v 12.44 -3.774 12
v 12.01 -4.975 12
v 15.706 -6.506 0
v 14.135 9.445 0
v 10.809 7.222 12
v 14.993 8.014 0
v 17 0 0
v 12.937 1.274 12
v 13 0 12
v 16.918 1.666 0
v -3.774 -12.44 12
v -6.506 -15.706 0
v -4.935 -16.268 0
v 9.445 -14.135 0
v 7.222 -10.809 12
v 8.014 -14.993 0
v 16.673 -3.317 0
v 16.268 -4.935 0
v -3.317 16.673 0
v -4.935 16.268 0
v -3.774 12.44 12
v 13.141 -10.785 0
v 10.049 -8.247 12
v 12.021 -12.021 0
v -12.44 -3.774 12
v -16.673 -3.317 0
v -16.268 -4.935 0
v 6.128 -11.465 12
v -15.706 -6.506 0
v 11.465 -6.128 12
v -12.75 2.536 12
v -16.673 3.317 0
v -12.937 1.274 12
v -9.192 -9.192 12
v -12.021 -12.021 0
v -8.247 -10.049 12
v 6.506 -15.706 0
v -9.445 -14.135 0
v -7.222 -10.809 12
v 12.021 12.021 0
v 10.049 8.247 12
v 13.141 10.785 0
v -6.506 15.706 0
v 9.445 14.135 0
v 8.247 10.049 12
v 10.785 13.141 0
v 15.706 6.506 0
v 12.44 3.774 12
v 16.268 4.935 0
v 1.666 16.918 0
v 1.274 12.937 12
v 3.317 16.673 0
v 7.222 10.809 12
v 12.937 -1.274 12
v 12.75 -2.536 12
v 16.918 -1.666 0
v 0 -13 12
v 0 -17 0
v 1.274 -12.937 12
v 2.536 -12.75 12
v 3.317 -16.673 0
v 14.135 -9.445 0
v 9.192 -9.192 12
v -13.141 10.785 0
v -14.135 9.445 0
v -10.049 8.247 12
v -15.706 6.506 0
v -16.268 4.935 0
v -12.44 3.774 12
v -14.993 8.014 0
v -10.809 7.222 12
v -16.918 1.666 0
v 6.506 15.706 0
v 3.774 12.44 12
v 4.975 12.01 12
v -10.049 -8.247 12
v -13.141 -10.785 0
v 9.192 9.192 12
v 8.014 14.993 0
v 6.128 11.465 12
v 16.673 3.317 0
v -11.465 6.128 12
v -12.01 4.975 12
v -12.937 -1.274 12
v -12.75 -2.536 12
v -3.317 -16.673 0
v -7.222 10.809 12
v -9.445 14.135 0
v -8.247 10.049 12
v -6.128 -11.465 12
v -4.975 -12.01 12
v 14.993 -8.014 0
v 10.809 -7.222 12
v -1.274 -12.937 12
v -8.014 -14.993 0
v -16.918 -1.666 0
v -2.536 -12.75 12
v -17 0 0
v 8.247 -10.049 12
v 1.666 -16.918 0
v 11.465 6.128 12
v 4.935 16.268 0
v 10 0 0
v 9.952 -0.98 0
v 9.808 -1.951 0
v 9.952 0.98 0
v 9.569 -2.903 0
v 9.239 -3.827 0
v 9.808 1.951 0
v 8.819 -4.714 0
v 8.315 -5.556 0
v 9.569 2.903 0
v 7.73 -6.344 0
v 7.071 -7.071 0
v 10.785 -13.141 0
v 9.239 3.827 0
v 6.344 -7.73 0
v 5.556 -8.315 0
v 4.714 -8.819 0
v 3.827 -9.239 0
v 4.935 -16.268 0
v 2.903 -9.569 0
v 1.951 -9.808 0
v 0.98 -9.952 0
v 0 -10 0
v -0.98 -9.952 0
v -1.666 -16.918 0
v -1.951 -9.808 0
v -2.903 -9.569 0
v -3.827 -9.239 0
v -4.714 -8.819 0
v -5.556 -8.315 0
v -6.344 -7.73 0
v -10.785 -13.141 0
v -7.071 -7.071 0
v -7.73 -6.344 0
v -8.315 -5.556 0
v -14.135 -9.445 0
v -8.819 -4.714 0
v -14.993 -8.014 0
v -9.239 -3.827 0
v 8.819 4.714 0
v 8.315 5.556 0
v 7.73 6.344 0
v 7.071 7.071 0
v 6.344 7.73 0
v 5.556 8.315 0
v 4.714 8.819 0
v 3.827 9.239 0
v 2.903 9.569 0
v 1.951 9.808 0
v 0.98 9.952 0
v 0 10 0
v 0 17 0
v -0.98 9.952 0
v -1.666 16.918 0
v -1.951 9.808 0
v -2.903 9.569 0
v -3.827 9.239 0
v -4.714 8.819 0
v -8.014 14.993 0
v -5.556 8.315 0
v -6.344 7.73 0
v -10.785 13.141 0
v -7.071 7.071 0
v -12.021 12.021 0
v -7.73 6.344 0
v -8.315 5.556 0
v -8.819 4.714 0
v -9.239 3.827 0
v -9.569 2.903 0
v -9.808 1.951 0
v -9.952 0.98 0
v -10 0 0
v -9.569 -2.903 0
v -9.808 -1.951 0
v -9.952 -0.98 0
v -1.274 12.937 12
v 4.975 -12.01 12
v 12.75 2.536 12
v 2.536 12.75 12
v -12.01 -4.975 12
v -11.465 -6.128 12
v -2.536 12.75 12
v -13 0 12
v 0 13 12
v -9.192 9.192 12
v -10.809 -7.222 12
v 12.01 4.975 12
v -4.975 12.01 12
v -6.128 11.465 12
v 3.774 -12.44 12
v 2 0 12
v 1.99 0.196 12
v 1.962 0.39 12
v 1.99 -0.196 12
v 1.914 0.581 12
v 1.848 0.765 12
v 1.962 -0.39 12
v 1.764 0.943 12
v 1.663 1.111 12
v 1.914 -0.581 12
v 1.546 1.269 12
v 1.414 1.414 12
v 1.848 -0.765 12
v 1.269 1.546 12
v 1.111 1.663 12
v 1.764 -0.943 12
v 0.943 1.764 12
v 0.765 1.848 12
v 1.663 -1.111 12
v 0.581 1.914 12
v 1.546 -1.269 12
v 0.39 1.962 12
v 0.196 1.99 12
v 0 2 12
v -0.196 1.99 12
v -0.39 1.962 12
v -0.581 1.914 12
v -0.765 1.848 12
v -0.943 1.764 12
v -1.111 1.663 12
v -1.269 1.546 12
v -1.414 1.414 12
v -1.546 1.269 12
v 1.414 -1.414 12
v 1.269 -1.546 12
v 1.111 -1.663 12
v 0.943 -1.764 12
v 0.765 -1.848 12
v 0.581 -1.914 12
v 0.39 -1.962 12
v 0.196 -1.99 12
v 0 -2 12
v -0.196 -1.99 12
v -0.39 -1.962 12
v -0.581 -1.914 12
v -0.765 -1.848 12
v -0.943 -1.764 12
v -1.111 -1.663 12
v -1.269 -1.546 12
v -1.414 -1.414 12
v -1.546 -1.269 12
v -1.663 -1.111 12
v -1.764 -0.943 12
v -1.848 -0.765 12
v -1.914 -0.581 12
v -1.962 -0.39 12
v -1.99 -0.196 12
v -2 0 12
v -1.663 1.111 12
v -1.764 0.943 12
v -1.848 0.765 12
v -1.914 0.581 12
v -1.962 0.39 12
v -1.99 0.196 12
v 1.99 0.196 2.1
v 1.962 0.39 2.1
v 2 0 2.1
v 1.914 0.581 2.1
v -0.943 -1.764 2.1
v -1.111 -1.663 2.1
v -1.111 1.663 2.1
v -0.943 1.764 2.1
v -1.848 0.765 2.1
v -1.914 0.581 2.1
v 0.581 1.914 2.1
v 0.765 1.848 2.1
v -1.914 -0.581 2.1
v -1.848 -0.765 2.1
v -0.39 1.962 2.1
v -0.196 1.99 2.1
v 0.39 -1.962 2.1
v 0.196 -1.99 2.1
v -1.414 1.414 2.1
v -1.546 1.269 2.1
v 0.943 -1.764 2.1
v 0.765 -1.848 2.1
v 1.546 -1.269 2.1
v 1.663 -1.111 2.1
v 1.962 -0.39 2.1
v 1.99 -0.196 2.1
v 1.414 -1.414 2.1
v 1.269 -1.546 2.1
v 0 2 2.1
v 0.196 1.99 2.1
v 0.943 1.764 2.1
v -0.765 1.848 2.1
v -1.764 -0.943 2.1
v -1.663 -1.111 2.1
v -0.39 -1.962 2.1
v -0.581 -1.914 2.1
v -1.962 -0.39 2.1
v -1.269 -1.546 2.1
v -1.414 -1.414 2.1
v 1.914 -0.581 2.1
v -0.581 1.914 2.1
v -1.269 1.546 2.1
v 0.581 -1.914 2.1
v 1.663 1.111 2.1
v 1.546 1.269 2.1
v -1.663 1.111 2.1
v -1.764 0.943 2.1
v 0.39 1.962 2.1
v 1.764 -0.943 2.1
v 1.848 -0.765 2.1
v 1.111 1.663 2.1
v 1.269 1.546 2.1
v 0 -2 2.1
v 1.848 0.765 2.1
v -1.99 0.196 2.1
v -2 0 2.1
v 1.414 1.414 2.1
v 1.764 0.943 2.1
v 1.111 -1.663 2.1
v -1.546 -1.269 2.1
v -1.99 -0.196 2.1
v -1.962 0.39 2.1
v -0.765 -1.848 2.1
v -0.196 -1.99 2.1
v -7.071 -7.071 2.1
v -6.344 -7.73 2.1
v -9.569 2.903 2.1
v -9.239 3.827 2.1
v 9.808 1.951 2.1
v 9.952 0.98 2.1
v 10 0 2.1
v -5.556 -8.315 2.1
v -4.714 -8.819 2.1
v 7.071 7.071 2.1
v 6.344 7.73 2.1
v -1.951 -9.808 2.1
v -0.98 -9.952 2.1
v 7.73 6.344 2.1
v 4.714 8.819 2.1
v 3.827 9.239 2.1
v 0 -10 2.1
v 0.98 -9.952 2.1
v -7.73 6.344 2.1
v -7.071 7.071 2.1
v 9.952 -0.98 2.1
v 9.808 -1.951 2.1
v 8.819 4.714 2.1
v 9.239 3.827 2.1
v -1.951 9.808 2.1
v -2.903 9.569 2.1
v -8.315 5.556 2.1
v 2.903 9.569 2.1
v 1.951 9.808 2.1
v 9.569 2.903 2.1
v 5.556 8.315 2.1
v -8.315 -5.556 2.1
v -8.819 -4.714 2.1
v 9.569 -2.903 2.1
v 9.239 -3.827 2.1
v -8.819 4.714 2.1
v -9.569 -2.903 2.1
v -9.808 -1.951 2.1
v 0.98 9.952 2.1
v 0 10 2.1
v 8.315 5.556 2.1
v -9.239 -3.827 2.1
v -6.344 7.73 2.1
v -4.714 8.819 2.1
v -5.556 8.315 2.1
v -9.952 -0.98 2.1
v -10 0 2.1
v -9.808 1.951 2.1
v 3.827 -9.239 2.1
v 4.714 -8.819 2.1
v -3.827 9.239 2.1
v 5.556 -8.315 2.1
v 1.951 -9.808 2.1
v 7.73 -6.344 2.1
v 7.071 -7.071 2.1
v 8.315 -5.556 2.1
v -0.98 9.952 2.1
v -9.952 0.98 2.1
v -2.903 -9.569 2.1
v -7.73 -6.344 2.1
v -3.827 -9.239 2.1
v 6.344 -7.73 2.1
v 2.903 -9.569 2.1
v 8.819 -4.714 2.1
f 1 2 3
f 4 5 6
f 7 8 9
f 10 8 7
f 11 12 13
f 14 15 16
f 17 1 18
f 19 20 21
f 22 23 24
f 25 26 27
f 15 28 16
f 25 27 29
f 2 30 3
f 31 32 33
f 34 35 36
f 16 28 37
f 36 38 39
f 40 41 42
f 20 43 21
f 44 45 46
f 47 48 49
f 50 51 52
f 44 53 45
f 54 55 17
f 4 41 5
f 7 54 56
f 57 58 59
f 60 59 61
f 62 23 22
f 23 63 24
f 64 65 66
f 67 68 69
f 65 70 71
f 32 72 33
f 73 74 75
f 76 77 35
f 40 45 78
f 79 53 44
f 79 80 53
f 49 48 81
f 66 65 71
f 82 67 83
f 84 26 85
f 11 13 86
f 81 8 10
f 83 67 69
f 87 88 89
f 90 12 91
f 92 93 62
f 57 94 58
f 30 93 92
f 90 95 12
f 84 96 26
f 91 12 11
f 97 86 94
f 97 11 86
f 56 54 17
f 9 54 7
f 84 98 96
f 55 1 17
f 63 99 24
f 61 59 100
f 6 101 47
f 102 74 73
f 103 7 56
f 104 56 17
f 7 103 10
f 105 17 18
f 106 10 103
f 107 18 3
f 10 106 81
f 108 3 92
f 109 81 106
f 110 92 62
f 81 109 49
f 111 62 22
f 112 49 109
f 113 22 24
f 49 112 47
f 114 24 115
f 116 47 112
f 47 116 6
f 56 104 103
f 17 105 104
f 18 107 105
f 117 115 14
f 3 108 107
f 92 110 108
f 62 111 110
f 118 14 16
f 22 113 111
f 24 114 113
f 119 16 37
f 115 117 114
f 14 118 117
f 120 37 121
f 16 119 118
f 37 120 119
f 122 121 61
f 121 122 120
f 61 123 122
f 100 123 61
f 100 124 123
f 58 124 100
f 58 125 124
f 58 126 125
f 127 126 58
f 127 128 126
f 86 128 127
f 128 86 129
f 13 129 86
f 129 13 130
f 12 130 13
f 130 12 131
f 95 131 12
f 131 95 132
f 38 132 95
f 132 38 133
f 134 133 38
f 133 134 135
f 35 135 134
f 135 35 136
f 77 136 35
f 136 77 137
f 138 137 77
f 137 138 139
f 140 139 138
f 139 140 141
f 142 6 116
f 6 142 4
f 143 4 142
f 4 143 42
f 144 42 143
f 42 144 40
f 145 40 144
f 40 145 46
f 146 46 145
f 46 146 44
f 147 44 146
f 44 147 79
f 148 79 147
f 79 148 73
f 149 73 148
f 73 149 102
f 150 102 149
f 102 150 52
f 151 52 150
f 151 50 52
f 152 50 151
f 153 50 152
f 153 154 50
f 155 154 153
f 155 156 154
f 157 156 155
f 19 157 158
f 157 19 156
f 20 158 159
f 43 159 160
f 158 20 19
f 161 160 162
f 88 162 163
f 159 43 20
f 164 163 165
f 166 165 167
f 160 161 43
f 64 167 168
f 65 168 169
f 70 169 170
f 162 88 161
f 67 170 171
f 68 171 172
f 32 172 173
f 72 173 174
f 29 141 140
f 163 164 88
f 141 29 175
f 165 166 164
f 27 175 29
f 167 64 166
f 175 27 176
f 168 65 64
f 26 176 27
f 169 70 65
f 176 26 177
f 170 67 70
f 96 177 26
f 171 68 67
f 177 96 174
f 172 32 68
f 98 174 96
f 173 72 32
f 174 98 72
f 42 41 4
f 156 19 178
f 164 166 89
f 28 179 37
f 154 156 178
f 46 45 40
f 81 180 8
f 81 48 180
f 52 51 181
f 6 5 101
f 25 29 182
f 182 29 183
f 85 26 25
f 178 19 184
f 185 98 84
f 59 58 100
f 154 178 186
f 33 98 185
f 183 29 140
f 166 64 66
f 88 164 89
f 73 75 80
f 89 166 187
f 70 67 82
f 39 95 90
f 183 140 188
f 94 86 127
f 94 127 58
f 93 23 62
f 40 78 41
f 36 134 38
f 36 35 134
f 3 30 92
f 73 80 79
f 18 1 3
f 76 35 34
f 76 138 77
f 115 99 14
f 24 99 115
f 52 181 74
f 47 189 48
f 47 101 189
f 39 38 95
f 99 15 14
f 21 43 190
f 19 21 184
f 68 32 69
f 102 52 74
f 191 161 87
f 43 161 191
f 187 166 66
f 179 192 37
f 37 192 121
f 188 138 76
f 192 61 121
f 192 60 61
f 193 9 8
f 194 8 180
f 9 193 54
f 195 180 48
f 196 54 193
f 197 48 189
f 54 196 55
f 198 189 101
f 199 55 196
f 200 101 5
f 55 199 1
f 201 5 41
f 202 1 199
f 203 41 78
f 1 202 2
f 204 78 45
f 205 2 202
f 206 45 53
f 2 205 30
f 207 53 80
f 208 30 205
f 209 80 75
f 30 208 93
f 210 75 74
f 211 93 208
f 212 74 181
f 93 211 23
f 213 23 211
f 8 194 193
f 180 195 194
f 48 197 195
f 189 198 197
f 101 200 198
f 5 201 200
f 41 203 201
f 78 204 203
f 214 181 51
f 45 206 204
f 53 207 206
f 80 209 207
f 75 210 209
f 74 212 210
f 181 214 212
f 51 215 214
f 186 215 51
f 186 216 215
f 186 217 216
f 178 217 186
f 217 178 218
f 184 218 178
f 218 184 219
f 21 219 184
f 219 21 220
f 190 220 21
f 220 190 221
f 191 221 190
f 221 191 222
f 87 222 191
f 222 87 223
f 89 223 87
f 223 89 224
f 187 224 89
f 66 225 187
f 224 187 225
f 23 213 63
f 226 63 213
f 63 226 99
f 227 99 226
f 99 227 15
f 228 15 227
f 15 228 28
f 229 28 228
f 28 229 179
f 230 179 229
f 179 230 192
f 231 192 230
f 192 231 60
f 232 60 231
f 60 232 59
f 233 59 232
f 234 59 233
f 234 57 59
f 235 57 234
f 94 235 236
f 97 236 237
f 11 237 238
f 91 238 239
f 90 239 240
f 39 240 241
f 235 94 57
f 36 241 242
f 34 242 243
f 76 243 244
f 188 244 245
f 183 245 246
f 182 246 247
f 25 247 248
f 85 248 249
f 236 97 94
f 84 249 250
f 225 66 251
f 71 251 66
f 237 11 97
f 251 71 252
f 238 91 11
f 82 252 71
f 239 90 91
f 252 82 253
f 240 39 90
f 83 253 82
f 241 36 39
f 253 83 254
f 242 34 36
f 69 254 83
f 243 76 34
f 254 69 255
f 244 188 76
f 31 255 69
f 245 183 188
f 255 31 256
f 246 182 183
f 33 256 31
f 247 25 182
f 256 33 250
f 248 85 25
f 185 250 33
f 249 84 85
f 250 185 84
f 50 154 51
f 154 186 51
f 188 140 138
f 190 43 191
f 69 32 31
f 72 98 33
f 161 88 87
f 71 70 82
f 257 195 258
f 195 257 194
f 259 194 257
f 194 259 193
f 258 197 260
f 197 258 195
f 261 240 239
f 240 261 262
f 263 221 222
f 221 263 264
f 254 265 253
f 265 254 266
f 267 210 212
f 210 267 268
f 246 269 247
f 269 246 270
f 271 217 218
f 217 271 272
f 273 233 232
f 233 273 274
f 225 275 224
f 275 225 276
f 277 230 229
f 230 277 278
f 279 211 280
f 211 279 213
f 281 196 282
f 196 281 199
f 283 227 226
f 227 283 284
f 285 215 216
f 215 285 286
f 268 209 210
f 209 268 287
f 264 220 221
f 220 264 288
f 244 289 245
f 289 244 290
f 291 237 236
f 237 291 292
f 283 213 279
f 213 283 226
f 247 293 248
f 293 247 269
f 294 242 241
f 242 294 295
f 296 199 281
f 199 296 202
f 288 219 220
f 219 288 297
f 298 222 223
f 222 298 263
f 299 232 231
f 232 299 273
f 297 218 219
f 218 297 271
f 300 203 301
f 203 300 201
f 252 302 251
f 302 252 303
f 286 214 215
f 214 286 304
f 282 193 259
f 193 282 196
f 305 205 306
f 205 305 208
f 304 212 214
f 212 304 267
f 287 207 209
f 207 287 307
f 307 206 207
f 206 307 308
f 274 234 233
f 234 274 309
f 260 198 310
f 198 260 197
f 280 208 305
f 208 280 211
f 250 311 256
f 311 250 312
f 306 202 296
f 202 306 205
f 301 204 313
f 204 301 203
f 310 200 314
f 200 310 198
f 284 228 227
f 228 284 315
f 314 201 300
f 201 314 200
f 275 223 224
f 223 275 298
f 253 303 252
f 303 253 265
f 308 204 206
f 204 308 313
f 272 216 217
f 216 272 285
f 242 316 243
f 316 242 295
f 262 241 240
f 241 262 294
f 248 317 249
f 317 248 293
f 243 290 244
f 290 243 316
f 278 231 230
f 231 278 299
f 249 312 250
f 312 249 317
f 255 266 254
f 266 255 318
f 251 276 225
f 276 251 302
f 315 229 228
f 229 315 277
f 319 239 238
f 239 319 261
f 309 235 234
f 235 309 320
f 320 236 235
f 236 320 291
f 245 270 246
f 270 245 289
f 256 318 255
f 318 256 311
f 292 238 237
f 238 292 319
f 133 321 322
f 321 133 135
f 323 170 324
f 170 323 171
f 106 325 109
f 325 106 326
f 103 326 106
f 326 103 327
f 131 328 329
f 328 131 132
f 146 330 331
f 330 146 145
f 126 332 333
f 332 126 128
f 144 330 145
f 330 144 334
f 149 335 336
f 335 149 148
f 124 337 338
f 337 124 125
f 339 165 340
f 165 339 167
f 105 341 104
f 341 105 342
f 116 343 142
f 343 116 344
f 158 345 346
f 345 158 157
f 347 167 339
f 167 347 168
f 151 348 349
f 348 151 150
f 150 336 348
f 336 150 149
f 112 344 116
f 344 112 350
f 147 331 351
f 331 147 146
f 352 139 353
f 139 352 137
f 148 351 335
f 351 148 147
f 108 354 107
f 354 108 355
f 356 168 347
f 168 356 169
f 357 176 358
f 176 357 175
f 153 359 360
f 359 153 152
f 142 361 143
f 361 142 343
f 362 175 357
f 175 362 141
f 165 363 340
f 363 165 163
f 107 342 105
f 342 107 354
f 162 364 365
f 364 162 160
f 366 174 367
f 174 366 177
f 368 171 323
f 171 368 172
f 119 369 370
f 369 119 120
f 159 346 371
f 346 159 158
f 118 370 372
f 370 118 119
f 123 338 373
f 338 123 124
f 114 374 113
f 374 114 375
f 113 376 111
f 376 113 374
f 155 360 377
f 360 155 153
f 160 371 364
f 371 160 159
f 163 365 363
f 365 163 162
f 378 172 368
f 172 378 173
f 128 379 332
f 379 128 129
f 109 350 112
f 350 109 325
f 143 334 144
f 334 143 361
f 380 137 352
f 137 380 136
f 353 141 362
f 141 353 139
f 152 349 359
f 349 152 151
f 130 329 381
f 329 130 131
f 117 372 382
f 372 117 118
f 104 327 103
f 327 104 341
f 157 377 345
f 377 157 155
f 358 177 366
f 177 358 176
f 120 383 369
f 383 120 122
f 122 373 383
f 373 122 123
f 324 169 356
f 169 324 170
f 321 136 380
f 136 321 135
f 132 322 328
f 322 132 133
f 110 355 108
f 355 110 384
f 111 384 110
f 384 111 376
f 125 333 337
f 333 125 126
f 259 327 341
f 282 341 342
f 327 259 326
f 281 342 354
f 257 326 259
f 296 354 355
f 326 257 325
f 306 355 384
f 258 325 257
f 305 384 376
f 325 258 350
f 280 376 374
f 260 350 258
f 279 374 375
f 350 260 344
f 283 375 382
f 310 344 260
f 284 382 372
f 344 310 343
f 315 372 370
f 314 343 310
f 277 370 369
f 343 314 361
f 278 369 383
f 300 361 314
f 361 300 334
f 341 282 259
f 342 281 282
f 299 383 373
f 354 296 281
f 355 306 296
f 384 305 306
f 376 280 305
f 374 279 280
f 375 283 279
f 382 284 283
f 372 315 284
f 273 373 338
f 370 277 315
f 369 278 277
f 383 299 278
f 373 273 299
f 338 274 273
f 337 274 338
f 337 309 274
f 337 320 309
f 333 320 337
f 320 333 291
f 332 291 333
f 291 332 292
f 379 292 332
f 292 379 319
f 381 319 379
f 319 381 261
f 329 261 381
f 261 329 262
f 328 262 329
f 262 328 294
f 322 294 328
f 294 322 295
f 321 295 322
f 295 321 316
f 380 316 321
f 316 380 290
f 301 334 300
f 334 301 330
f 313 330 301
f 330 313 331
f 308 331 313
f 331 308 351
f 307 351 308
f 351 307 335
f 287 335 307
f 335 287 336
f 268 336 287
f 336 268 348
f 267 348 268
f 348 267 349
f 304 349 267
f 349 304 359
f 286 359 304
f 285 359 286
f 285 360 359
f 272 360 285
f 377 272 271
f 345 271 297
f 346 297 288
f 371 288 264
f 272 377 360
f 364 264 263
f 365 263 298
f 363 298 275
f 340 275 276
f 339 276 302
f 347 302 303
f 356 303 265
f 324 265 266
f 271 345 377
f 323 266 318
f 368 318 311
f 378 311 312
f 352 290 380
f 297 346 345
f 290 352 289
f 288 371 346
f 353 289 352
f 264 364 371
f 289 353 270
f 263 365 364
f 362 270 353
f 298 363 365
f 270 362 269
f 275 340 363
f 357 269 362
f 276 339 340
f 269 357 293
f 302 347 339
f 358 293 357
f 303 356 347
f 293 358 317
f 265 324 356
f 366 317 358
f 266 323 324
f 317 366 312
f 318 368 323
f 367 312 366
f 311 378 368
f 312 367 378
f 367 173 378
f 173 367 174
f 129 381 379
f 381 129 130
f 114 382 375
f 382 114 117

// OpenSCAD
// Generated with SolidPython2 for OpenSCAD task-013
$fn = 64;

difference() {
	cylinder(h = 12, r1 = 17, r2 = 13);
	translate(v = [0, 0, -1]) {
		cylinder(h = 14, r = 2.0);
	}
	translate(v = [0, 0, -0.1]) {
		cylinder(h = 2.2, r = 10);
	}
}
